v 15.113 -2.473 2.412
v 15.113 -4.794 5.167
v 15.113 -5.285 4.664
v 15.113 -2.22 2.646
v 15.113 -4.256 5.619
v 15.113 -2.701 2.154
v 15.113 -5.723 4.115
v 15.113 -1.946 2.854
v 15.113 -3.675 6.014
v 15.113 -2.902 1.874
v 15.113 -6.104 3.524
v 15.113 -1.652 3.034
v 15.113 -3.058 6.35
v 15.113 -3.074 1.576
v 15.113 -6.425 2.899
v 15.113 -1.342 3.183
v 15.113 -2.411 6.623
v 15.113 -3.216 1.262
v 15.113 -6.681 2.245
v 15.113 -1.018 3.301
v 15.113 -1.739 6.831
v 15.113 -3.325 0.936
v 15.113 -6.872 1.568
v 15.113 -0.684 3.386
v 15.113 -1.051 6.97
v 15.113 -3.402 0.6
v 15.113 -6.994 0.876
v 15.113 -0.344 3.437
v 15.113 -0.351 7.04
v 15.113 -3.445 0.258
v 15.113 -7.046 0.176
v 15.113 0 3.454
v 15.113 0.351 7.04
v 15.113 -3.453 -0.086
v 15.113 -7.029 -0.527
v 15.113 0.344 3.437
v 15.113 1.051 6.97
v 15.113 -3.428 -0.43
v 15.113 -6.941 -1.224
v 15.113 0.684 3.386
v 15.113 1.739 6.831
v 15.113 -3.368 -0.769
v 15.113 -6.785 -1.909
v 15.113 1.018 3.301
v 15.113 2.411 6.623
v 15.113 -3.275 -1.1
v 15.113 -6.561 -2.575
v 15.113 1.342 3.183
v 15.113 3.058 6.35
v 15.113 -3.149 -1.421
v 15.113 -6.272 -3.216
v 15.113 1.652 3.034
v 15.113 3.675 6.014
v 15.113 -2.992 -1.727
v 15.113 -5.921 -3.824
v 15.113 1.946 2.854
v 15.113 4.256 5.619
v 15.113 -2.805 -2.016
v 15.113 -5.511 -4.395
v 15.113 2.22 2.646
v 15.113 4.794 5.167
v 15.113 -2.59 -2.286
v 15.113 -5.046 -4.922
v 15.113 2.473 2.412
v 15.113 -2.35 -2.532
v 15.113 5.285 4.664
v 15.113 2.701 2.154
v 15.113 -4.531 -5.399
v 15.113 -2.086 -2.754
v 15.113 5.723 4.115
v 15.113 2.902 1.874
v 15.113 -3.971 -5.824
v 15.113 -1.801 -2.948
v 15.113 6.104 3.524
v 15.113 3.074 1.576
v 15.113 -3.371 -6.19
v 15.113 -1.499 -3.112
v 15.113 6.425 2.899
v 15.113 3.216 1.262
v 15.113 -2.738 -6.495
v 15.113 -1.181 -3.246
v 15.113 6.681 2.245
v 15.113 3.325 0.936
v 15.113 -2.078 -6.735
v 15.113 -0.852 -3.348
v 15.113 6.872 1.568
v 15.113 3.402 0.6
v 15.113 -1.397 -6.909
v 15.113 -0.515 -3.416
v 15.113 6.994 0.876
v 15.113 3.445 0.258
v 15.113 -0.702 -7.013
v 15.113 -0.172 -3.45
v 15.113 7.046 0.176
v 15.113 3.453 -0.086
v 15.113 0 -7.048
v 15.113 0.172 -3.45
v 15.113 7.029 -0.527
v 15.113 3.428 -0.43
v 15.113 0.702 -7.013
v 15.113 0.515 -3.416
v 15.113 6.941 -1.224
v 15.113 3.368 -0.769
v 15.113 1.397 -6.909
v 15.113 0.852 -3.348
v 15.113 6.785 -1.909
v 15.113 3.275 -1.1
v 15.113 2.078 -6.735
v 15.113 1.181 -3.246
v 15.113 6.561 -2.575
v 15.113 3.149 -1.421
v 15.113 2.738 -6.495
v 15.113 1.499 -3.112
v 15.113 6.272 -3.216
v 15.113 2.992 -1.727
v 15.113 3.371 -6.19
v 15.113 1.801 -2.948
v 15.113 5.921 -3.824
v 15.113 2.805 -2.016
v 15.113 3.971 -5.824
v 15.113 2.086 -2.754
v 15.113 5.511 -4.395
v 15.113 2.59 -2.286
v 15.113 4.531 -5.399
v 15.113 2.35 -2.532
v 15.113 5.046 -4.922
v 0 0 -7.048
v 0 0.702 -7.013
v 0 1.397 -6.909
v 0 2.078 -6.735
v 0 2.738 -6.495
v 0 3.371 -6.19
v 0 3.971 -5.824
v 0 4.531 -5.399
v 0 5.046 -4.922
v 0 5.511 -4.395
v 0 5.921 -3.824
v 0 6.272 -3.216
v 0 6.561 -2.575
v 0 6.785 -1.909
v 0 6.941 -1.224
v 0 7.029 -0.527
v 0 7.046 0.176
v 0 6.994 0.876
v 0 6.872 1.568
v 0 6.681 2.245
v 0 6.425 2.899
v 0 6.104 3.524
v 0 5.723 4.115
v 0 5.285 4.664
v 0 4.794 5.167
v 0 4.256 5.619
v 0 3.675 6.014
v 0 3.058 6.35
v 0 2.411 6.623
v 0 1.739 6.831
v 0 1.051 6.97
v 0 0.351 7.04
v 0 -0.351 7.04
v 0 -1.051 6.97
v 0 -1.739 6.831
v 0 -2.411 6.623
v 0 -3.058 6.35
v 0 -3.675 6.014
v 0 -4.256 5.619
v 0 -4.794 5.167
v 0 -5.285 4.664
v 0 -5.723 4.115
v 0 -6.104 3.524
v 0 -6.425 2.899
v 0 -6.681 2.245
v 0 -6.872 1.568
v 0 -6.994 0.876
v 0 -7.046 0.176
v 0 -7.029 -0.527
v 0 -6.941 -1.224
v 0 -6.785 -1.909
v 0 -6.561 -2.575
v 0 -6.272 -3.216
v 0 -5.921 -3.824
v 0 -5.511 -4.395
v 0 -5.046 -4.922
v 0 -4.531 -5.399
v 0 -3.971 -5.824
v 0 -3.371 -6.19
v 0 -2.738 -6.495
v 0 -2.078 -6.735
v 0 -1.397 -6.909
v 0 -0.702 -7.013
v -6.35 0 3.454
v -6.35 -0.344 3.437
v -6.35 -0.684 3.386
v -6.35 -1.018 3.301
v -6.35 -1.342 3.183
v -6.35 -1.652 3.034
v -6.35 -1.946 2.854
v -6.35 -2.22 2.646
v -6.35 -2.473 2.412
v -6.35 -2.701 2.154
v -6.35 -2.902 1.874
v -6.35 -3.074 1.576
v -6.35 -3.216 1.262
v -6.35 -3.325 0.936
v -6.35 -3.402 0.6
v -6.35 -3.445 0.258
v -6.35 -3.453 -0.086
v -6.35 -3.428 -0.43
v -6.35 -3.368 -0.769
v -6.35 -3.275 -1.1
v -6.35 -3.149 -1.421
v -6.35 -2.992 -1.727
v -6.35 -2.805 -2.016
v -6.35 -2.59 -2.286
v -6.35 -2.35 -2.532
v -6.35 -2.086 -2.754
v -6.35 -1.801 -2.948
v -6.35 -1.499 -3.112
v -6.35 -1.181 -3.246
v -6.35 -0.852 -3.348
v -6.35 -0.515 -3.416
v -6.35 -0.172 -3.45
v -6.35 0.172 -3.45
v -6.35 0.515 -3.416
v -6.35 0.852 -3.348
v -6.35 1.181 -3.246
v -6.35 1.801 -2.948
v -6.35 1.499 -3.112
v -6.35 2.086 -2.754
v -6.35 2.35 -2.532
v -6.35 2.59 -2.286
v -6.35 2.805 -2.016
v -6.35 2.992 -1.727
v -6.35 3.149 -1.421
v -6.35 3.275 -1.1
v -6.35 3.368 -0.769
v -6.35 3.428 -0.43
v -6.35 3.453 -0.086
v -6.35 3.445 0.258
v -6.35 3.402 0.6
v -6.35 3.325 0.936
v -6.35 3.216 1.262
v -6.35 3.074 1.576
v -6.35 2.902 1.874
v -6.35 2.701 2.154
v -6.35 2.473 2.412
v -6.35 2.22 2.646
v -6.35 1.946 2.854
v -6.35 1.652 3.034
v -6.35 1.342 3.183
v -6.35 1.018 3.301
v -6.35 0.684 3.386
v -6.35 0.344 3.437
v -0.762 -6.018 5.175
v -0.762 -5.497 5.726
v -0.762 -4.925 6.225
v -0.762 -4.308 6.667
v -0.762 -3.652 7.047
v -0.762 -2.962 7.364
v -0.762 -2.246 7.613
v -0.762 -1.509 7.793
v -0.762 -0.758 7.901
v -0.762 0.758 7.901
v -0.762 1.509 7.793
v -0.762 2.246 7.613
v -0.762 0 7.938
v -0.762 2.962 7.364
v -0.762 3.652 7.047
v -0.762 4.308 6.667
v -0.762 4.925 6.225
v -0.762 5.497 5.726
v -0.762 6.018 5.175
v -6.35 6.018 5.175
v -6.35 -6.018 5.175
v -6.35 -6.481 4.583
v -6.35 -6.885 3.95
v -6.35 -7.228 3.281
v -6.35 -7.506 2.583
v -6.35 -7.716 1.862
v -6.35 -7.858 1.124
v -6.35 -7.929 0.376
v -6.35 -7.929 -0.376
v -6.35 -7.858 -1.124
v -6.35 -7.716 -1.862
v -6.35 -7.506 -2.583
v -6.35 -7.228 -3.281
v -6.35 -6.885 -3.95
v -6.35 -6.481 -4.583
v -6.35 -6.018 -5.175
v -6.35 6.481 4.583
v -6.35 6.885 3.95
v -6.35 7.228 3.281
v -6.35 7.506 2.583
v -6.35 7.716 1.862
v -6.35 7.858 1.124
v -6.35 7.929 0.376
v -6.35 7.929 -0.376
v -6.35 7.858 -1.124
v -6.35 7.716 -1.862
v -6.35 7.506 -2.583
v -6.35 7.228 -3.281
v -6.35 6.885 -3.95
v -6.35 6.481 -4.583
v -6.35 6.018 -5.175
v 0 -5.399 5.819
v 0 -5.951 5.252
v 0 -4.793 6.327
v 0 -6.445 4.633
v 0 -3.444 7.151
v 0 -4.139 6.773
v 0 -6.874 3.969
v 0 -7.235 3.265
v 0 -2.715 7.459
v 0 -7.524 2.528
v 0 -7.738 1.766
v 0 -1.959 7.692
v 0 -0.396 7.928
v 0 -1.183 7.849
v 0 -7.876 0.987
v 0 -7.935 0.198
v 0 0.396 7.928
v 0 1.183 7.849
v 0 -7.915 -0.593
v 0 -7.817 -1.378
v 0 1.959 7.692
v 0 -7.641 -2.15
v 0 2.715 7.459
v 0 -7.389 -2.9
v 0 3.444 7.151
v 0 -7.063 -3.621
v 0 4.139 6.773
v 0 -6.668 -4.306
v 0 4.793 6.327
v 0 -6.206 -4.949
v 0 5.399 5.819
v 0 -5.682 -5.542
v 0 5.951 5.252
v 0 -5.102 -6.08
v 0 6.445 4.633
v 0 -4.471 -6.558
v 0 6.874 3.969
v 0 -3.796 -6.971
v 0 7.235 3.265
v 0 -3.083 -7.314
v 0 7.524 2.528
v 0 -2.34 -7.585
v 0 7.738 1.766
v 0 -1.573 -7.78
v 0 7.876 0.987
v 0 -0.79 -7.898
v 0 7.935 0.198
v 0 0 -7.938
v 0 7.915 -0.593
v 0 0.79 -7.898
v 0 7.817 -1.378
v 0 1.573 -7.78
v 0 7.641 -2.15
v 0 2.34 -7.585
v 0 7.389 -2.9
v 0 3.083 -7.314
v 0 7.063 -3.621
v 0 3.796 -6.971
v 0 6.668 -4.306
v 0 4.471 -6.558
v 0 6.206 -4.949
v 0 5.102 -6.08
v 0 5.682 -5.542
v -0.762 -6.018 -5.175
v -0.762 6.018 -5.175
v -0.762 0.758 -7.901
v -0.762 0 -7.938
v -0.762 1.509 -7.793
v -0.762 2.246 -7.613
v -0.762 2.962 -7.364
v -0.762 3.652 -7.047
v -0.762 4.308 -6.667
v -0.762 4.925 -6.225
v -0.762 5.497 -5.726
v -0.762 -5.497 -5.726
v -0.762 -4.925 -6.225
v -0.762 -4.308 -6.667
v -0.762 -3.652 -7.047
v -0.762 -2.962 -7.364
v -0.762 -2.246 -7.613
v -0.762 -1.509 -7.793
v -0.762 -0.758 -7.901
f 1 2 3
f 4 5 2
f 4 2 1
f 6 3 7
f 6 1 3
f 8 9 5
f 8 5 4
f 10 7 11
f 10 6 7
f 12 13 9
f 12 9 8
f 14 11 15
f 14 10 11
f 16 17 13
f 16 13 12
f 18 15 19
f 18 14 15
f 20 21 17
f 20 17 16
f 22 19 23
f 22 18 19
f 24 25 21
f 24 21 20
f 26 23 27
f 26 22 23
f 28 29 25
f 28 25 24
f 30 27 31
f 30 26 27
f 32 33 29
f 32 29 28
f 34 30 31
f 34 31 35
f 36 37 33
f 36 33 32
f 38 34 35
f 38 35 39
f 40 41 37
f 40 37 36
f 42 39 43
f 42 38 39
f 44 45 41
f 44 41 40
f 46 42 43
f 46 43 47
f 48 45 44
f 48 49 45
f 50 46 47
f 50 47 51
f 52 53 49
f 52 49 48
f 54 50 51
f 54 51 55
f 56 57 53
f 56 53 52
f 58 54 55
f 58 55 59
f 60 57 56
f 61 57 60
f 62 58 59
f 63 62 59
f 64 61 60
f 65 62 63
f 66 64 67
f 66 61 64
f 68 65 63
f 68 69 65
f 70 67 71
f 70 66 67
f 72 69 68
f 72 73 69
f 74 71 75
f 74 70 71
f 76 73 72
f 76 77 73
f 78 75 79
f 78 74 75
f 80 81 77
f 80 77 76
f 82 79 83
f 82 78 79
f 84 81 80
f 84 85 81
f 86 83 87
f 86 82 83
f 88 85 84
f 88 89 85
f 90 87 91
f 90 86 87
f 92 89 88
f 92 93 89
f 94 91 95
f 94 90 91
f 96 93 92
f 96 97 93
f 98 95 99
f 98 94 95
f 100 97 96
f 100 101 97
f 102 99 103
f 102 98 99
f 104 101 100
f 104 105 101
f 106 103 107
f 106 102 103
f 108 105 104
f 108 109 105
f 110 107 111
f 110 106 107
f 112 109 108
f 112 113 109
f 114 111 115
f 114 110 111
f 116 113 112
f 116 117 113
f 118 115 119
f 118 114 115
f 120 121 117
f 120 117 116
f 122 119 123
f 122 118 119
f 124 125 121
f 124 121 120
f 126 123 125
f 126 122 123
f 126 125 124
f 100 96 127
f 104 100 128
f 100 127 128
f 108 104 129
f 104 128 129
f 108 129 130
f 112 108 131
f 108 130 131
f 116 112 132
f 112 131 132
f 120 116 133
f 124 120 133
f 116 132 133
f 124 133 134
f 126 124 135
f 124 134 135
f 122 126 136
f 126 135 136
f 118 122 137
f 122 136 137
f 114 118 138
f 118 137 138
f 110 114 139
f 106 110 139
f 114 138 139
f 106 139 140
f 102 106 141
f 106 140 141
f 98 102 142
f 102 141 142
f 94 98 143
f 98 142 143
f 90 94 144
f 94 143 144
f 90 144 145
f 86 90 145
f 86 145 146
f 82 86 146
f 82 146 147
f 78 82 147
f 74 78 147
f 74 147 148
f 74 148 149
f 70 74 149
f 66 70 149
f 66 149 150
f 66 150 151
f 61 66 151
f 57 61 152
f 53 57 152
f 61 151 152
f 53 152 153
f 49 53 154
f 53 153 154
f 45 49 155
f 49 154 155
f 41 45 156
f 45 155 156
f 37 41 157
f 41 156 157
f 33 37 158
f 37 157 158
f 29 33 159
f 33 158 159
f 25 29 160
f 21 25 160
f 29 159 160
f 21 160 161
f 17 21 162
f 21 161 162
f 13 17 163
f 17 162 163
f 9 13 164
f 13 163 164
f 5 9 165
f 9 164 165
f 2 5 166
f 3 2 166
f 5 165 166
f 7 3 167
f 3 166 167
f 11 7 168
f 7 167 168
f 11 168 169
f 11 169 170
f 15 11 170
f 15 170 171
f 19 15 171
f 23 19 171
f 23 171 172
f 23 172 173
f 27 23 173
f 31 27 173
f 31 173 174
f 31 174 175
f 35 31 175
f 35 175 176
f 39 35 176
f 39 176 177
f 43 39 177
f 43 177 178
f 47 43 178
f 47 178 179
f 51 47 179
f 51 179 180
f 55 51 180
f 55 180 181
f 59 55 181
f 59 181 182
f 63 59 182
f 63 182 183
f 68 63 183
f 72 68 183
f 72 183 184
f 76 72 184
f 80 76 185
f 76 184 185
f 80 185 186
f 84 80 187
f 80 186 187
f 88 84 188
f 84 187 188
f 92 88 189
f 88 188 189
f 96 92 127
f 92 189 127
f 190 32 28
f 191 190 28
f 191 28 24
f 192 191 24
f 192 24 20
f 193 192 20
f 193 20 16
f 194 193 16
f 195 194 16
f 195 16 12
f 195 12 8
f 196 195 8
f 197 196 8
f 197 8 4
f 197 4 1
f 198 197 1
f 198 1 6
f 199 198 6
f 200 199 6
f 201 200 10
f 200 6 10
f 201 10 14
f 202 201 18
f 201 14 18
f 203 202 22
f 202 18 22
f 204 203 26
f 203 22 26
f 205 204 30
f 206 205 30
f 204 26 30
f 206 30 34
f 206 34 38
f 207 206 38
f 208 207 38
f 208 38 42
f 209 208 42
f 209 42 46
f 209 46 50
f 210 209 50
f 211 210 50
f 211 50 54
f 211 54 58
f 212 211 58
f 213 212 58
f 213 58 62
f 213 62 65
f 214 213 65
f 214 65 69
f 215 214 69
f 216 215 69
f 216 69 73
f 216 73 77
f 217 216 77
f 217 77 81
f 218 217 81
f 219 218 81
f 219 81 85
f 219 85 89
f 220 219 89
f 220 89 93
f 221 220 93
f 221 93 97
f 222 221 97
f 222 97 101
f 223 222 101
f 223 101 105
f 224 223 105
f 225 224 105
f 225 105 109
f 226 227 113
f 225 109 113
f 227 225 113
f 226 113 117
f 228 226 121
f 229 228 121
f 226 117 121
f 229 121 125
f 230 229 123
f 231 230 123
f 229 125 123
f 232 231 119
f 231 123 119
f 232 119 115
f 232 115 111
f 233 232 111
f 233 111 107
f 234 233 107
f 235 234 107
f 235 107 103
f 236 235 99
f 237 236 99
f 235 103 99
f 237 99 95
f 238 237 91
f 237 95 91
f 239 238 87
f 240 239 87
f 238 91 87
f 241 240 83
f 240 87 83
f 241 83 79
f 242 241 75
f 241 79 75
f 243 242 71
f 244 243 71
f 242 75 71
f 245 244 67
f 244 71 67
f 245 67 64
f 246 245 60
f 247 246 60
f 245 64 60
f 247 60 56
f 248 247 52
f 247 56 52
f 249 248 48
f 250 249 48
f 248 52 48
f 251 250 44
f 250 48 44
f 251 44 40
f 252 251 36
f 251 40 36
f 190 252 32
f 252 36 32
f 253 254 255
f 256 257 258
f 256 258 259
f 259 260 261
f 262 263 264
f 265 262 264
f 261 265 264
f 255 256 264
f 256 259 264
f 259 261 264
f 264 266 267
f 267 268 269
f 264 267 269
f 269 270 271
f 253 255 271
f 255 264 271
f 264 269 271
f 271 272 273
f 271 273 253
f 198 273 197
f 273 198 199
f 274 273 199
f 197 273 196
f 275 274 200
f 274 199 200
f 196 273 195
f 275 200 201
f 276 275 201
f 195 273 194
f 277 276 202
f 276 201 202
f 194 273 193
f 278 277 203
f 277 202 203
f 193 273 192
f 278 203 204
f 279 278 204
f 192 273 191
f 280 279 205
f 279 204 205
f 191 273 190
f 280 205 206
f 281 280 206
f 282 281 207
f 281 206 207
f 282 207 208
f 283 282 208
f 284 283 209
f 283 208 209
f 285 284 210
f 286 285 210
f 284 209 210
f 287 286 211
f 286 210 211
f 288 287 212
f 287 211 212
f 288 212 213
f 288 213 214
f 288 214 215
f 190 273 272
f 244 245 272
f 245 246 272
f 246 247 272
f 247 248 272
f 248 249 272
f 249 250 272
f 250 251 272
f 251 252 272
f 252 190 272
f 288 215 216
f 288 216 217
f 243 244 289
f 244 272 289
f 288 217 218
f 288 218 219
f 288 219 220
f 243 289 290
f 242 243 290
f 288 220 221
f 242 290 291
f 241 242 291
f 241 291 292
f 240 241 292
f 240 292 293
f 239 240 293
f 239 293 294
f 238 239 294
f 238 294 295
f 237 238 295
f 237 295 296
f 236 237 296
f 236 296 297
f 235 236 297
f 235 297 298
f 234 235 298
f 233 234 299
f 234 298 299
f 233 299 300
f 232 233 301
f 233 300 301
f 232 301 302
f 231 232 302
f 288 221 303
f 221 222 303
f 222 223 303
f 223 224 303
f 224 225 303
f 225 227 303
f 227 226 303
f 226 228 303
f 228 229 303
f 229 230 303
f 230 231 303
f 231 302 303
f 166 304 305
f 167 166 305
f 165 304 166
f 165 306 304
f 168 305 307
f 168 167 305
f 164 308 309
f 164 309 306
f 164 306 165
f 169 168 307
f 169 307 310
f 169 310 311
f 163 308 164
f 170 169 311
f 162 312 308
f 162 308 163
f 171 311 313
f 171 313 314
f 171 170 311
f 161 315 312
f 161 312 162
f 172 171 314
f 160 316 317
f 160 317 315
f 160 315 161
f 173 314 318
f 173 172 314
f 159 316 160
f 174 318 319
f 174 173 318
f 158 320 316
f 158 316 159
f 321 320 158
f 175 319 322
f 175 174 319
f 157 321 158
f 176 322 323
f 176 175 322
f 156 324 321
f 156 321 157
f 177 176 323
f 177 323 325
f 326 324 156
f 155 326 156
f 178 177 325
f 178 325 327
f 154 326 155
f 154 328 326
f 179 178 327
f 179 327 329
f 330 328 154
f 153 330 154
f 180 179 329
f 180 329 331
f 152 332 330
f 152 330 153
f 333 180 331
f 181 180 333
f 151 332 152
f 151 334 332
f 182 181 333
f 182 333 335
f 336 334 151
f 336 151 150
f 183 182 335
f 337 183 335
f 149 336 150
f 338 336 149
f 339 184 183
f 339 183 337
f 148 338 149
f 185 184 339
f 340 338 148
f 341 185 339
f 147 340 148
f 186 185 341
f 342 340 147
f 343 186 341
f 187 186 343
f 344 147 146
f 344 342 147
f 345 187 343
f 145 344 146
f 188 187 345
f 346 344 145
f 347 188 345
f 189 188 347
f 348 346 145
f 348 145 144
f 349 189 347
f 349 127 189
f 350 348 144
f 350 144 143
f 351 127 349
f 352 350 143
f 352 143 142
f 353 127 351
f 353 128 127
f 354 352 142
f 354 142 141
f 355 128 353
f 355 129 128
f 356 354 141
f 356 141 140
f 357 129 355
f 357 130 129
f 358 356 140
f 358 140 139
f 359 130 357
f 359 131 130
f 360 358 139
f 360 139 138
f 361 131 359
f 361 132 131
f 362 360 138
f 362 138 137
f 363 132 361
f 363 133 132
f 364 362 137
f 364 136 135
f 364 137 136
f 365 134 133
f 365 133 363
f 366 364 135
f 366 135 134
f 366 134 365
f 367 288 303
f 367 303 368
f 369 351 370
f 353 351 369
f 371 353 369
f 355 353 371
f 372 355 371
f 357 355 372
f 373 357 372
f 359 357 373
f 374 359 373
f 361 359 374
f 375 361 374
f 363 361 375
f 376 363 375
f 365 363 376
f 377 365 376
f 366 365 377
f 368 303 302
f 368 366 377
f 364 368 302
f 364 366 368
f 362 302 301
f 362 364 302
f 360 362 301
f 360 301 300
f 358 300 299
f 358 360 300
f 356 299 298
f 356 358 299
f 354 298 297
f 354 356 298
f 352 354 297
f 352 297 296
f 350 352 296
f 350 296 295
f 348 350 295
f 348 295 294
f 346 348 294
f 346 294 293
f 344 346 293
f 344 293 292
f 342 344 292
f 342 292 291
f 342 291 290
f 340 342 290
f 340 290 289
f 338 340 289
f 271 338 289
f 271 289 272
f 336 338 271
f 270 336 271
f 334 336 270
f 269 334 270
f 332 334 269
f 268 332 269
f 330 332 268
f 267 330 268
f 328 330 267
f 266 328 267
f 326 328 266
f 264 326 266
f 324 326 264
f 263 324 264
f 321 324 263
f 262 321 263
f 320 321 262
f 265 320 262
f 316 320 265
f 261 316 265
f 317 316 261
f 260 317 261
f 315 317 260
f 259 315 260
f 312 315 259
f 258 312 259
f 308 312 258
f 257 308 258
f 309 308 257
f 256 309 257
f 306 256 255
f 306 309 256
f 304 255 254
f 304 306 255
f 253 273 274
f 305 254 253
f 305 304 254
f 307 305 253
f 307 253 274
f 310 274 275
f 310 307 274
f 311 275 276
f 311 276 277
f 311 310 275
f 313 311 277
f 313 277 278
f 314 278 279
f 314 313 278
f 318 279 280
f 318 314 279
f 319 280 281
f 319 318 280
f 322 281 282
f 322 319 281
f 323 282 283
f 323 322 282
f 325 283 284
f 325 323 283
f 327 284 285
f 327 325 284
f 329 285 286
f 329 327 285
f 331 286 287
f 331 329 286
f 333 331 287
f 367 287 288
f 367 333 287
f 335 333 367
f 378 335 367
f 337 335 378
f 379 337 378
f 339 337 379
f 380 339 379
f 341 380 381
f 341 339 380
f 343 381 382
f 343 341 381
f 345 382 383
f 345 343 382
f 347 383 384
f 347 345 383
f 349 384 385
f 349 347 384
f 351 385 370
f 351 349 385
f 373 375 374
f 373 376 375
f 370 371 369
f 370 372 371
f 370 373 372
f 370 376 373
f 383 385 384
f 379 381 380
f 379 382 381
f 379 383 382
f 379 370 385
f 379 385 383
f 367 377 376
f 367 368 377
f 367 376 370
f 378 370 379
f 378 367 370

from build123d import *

# Parameters (mm, degrees)
SKETCH2_R                = 7.9375
BOSS_EXTRUDE1_DEPTH      = 6.35
SKETCH3_R                = 7.0485
BOSS_EXTRUDE2_DEPTH      = 15.113
SKETCH4_W                = 5.588
SKETCH4_H                = 2.76225
CUT_EXTRUDE1_DEPTH       = 6.35
F_5_16_24_TAPPED_HOLE1_D = 6.9088


with BuildPart() as part:
    # Sketch2 → Boss-Extrude1 (new body)
    with BuildSketch(Plane(origin=(0, 0, 0), x_dir=(0, 0, -1), z_dir=(1, 0, 0))):
        Circle(SKETCH2_R)
    extrude(amount=-BOSS_EXTRUDE1_DEPTH)

    # Sketch3 → Boss-Extrude2 (add)
    with BuildSketch(Plane(origin=(0, 0, 0), x_dir=(0, 0, -1), z_dir=(1, 0, 0))):
        Circle(SKETCH3_R)
    extrude(amount=BOSS_EXTRUDE2_DEPTH)

    # Sketch4 → Cut-Extrude1 (cut, symmetric)
    with BuildSketch(Plane(origin=(0, 0, 0), x_dir=(1, 0, 0), z_dir=(0, 1, 0))):
        with Locations((-3.556, 6.556375)):
            Rectangle(SKETCH4_W, SKETCH4_H)
        with Locations((-3.556, -6.556375)):
            Rectangle(SKETCH4_W, SKETCH4_H)
    extrude(amount=CUT_EXTRUDE1_DEPTH, both=True, mode=Mode.SUBTRACT)

    # 5/16-24 Tapped Hole1 (through all)
    with Locations(Plane(origin=(-6.35, 0, 0), x_dir=(0, 0, -1), z_dir=(-1, 0, 0))):
        with Locations((0, 0)):
            Hole(F_5_16_24_TAPPED_HOLE1_D / 2)


solid = part.part
